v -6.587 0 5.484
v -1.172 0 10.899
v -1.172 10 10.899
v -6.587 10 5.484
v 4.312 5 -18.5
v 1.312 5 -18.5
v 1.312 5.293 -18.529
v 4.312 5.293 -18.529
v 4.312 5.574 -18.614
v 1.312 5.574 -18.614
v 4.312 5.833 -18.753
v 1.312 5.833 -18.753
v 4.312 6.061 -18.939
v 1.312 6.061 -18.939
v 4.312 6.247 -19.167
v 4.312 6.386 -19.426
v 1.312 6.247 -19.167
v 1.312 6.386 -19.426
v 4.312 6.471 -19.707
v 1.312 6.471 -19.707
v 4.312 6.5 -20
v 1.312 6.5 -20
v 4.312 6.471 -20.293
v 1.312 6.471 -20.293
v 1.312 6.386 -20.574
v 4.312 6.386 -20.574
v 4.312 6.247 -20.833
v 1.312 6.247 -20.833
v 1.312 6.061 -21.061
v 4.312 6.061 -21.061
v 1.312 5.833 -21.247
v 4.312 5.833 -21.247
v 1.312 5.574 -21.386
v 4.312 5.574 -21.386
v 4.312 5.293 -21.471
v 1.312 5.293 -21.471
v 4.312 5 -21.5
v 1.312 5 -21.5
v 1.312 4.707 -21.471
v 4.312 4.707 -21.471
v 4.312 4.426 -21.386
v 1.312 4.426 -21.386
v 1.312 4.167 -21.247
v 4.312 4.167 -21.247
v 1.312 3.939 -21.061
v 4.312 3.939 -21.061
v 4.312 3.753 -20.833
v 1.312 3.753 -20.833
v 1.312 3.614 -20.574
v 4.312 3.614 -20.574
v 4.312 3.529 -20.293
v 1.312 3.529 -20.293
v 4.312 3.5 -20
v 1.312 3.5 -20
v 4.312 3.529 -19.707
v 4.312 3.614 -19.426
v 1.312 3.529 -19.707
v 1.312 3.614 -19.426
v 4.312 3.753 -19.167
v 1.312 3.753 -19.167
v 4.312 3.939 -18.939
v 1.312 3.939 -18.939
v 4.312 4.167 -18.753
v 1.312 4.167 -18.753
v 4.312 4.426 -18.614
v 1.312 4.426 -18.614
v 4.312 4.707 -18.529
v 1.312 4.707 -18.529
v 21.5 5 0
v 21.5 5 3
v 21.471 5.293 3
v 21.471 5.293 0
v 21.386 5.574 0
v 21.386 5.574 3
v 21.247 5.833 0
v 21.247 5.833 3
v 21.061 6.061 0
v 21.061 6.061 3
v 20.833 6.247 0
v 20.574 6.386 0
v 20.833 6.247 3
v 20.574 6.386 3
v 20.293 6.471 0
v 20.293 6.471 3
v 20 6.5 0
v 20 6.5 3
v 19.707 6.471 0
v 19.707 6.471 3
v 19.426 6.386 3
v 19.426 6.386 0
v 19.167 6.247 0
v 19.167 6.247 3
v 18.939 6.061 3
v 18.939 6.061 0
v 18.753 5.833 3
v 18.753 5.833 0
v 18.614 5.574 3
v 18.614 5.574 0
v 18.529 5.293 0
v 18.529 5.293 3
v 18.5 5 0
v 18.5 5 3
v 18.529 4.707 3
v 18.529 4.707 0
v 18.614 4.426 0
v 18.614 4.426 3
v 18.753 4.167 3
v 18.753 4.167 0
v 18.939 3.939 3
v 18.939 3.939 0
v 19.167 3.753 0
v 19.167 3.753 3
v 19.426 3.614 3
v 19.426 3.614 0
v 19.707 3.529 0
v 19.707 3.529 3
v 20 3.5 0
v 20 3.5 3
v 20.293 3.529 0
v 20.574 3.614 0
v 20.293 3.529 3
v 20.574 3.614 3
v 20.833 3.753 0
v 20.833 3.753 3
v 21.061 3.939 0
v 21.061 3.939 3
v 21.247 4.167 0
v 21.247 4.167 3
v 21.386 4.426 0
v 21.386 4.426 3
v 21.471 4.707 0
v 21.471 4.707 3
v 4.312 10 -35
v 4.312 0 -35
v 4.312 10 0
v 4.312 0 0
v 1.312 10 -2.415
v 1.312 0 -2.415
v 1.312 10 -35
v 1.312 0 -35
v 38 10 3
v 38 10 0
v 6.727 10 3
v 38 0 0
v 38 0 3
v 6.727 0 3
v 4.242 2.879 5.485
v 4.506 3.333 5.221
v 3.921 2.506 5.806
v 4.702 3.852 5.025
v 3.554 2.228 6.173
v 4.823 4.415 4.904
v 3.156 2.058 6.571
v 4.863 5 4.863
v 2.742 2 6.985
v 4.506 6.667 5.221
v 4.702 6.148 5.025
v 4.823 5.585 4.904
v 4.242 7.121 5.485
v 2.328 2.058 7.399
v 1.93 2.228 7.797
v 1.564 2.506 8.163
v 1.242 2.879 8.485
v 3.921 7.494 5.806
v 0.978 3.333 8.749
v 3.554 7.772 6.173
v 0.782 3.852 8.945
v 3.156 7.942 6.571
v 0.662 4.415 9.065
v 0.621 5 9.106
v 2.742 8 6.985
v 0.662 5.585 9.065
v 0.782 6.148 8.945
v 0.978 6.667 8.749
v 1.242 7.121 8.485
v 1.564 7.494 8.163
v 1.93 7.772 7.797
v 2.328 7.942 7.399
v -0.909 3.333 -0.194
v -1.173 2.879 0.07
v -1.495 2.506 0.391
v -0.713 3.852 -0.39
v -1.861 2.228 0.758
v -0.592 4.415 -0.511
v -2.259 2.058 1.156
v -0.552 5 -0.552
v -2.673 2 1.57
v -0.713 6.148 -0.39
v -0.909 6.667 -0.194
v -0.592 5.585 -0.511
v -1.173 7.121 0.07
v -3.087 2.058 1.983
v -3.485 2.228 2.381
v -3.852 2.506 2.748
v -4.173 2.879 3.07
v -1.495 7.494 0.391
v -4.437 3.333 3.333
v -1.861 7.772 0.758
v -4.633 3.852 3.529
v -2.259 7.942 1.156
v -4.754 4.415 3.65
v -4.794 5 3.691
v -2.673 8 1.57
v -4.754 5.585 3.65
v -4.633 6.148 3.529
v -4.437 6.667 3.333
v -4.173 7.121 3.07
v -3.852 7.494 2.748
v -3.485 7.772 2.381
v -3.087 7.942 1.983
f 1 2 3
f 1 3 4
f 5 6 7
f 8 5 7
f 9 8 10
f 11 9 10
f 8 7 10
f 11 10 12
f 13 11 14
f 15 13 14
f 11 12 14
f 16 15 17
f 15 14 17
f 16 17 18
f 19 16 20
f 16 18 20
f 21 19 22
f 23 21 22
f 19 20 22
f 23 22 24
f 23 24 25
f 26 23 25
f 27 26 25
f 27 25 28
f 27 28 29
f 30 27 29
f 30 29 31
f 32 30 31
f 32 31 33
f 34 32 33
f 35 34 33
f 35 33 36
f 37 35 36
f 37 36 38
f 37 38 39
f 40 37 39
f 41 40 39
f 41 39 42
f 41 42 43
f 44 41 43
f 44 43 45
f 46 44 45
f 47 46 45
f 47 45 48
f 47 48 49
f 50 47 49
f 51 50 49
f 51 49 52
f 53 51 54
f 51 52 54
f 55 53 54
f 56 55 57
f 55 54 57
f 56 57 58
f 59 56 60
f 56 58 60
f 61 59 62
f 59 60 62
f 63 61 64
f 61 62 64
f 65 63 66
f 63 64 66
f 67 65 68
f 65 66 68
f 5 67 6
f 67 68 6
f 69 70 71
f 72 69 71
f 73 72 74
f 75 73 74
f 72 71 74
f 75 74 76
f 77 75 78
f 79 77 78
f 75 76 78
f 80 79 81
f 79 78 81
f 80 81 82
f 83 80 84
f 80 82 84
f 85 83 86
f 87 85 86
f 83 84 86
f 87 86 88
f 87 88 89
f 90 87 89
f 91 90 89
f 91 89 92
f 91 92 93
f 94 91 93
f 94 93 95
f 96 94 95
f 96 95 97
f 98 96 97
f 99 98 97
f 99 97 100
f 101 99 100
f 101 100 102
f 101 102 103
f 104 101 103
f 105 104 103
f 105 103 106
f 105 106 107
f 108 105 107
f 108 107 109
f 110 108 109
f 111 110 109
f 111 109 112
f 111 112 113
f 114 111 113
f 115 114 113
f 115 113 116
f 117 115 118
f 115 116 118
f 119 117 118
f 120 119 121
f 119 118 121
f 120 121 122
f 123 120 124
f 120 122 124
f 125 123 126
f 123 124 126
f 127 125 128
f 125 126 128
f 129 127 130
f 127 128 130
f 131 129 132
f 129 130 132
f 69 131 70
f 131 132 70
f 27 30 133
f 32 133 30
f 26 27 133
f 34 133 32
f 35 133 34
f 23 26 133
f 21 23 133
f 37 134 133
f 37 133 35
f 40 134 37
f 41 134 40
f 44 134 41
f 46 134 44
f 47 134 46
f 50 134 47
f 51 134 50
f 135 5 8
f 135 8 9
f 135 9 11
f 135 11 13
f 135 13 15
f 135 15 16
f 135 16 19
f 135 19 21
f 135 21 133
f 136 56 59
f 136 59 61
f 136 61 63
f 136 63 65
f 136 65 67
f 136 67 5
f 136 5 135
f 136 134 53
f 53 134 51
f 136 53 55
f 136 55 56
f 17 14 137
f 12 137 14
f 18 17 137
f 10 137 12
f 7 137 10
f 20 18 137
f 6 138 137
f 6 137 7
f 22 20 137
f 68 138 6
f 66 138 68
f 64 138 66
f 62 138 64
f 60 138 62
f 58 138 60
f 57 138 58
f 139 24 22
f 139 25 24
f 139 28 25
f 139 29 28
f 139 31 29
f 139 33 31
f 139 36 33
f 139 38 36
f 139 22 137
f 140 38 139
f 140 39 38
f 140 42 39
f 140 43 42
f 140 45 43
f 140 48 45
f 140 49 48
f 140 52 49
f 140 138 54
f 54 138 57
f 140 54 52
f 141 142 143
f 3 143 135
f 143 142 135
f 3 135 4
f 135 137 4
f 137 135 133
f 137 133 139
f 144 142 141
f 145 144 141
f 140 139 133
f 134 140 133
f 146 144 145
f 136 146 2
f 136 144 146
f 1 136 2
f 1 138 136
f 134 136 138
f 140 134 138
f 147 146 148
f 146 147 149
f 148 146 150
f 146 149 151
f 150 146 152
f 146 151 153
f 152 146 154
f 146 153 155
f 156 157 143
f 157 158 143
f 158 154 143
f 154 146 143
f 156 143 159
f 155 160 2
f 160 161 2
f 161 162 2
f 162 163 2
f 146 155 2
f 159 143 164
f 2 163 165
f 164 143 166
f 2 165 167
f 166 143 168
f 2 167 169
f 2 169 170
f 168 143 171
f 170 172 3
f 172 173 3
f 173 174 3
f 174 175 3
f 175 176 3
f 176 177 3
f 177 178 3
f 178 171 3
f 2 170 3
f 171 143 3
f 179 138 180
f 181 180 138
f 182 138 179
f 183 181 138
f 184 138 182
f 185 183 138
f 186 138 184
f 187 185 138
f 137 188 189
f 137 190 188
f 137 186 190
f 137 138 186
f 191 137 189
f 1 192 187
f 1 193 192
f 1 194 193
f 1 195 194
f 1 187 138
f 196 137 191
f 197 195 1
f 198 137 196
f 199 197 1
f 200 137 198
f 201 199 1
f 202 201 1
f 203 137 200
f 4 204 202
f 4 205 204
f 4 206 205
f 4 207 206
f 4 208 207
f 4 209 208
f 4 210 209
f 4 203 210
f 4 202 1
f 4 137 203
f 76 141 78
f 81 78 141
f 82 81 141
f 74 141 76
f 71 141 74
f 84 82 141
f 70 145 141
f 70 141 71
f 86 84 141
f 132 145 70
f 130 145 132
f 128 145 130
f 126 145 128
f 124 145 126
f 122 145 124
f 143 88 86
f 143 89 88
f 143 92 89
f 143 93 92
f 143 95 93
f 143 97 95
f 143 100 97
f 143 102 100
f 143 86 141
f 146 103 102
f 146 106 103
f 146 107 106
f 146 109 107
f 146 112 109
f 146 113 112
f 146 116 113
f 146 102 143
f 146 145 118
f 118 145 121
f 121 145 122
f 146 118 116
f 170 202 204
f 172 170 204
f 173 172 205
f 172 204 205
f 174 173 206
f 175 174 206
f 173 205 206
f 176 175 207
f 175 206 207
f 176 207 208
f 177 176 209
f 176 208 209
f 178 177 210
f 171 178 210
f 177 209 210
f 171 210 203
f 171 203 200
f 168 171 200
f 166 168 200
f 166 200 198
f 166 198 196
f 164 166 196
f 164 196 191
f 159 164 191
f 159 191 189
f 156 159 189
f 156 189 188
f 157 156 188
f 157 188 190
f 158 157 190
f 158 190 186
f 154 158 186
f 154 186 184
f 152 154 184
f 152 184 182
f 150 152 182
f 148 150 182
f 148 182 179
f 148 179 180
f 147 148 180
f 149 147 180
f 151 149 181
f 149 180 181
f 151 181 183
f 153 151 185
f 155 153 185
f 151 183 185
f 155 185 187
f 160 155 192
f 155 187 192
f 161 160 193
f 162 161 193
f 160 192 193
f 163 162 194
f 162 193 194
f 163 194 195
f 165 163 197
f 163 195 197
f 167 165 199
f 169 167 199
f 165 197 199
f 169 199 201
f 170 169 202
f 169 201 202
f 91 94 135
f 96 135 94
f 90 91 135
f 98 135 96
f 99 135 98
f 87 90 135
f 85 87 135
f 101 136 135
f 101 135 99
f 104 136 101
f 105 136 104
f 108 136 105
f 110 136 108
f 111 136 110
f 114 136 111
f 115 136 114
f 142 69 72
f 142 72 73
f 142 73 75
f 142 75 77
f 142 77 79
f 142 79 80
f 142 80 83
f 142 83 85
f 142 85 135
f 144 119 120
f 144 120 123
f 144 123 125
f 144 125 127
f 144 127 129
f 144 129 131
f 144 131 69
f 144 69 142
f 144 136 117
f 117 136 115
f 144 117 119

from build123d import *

# Parameters (mm, degrees)
BOSS_EXTRUDE1_DEPTH = 10
SKETCH3_R           = 1.5
CUT_EXTRUDE1_DEPTH  = 30
SKETCH4_R           = 1.5
CUT_EXTRUDE2_DEPTH  = 30
CUT_EXTRUDE5_DEPTH  = 30
SKETCH9_R           = 3
CUT_EXTRUDE6_DEPTH  = 30


with BuildPart() as part:
    # Sketch1 → Boss-Extrude1 (new body)
    with BuildSketch(Plane(origin=(0, 0, 0), x_dir=(1, 0, 0), z_dir=(0, 1, 0))):
        Polygon((1.311744675, 2.415195475), (1.311744675, 35), (4.311744675, 35), (4.311744675, 0), (38, 0), (38, -3), (6.726940148, -3), (6.726940148, -11.726940148), (3.191406243, -15.262474054), (-10.950729381, -1.120338431), (-7.415195475, 2.415195475), align=None)
    extrude(amount=BOSS_EXTRUDE1_DEPTH)

    # Sketch3 → Cut-Extrude1 (cut)
    with BuildSketch(Plane.XY.offset(3)):
        with Locations((20, 5)):
            Circle(SKETCH3_R)
    extrude(amount=-CUT_EXTRUDE1_DEPTH, mode=Mode.SUBTRACT)

    # Sketch4 → Cut-Extrude2 (cut)
    with BuildSketch(Plane.ZY.offset(-1.311744675)):
        with Locations((-20, 5)):
            Circle(SKETCH4_R)
    extrude(amount=-CUT_EXTRUDE2_DEPTH, mode=Mode.SUBTRACT)

    # Sketch8 → Cut-Extrude5 (cut)
    with BuildSketch(Plane(origin=(0, 10, 0), x_dir=(1, 0, 0), z_dir=(0, 1, 0))):
        Polygon((1.311744675, 2.415195475), (-7.06515363, -5.961702829), (-14.174938383, 1.148081923), (-5.798040078, 9.524980228), align=None)
        Polygon((6.726940148, -3), (-1.172063832, -10.89900398), (4.537107227, -16.608175039), (12.436111207, -8.709171058), align=None)
    extrude(amount=-CUT_EXTRUDE5_DEPTH, mode=Mode.SUBTRACT)

    # Sketch9 → Cut-Extrude6 (cut)
    with BuildSketch(Plane(origin=(-0.5517254, 0, -0.5517254), x_dir=(-0.7071067811865474, 0, 0.7071067811865477), z_dir=(-0.7071067811865477, 0, -0.7071067811865474))):
        with Locations((3, 5)):
            Circle(SKETCH9_R)
    extrude(amount=-CUT_EXTRUDE6_DEPTH, mode=Mode.SUBTRACT)


solid = part.part
